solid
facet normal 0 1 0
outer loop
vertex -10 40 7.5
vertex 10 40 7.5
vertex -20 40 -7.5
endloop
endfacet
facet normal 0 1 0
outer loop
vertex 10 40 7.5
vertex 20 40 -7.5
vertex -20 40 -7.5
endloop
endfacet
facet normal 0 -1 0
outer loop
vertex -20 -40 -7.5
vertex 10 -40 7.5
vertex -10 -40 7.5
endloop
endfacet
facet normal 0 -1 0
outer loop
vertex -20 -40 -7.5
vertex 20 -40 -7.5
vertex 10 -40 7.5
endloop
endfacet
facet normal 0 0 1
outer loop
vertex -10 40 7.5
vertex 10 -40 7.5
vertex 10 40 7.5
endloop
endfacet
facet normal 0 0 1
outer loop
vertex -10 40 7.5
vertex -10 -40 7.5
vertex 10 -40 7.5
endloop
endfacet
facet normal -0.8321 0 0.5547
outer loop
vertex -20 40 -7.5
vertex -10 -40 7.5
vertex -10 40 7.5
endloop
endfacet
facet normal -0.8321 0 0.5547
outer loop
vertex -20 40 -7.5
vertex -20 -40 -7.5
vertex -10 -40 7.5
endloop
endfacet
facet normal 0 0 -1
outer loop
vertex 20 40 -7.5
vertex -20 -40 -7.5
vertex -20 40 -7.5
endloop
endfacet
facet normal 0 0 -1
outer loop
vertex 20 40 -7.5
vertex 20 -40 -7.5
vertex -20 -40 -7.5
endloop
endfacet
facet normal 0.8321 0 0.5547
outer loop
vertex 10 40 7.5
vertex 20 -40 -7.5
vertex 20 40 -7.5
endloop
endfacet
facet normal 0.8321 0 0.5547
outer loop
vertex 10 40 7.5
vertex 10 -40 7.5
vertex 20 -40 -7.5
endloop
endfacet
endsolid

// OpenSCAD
//-- Parámetros del trapecio
B=40;   //-- Base larga
b=20;   //-- Base corta
h=15;   //-- Altura

//-- Rotar prisma para apoyarlo en plano XY
rotate([90,0,0])

//-- Extrusión lineal del trapecio
linear_extrude(height=80,center=true)

//-- Trapecio
polygon(points=[
    [-B/2,-h/2],
    [-b/2,h/2],
    [b/2,h/2],
    [B/2,-h/2],
]);
